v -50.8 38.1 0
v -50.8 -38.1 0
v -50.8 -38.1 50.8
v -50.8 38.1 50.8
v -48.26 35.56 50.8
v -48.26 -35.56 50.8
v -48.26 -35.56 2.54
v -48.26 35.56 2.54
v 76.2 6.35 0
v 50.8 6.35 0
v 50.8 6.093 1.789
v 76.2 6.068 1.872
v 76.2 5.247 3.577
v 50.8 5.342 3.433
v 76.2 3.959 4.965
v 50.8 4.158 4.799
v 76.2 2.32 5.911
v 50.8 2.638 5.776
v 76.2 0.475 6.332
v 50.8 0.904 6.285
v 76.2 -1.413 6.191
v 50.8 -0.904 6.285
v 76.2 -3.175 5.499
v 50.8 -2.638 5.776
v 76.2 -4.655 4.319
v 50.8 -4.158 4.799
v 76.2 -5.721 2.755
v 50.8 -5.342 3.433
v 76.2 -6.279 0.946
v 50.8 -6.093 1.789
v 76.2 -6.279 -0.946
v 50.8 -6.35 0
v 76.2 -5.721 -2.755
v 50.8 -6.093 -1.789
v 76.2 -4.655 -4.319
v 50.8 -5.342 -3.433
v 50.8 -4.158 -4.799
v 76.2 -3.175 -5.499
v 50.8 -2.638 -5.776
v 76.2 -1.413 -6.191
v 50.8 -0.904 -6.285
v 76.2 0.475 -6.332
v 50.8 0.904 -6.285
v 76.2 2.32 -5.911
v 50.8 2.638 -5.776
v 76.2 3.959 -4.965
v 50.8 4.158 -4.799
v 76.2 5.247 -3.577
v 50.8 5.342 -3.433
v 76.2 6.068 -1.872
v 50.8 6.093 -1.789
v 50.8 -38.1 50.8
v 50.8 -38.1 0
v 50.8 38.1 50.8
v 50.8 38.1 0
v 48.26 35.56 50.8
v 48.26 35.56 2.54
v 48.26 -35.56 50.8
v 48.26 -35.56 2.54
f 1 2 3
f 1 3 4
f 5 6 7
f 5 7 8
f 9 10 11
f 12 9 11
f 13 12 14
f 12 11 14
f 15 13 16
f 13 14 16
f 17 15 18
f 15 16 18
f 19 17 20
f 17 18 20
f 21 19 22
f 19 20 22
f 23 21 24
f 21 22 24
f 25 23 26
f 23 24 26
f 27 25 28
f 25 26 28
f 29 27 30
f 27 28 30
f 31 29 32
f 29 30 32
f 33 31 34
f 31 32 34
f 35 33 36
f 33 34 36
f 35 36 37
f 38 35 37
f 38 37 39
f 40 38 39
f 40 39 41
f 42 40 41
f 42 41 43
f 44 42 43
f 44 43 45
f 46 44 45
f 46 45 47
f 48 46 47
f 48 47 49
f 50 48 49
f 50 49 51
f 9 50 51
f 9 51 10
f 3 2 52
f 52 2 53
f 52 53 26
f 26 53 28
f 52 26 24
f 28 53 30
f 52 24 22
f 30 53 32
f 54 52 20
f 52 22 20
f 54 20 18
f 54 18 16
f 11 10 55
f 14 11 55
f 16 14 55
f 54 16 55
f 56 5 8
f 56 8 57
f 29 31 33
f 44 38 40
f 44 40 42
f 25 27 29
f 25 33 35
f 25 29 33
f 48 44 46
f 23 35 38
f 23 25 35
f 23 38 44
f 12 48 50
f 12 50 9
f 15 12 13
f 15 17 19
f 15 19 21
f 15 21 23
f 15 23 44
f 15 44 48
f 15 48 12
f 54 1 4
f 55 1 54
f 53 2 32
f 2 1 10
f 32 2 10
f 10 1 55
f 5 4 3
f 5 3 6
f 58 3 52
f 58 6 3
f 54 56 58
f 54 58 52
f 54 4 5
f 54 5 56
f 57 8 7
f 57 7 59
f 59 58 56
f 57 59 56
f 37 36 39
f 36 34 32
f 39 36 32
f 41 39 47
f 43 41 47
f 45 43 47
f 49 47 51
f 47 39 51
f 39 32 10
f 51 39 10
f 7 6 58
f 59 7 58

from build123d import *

# Parameters (mm, degrees)
F0_W     = 101.6
F0_H     = 76.2
F1_DEPTH = 50.8
F2_W     = 96.52
F2_H     = 71.12
F3_DEPTH = 48.26
F4_R     = 6.35
F5_DEPTH = 25.4


with BuildPart() as f1:
    # F0 (on Top) → F1 (new body)
    with BuildSketch(Plane.XY):
        Rectangle(F0_W, F0_H)
    extrude(amount=F1_DEPTH)

    # F2 (on face) → F3 (cut)
    with BuildSketch(Plane.XY.offset(50.8)):
        Rectangle(F2_W, F2_H)
    extrude(amount=-F3_DEPTH, mode=Mode.SUBTRACT)

    # F4 (on face) → F5 (join)
    with BuildSketch(Plane.YZ.offset(50.8)):
        Circle(F4_R)
    extrude(amount=F5_DEPTH)


solid = f1.part
